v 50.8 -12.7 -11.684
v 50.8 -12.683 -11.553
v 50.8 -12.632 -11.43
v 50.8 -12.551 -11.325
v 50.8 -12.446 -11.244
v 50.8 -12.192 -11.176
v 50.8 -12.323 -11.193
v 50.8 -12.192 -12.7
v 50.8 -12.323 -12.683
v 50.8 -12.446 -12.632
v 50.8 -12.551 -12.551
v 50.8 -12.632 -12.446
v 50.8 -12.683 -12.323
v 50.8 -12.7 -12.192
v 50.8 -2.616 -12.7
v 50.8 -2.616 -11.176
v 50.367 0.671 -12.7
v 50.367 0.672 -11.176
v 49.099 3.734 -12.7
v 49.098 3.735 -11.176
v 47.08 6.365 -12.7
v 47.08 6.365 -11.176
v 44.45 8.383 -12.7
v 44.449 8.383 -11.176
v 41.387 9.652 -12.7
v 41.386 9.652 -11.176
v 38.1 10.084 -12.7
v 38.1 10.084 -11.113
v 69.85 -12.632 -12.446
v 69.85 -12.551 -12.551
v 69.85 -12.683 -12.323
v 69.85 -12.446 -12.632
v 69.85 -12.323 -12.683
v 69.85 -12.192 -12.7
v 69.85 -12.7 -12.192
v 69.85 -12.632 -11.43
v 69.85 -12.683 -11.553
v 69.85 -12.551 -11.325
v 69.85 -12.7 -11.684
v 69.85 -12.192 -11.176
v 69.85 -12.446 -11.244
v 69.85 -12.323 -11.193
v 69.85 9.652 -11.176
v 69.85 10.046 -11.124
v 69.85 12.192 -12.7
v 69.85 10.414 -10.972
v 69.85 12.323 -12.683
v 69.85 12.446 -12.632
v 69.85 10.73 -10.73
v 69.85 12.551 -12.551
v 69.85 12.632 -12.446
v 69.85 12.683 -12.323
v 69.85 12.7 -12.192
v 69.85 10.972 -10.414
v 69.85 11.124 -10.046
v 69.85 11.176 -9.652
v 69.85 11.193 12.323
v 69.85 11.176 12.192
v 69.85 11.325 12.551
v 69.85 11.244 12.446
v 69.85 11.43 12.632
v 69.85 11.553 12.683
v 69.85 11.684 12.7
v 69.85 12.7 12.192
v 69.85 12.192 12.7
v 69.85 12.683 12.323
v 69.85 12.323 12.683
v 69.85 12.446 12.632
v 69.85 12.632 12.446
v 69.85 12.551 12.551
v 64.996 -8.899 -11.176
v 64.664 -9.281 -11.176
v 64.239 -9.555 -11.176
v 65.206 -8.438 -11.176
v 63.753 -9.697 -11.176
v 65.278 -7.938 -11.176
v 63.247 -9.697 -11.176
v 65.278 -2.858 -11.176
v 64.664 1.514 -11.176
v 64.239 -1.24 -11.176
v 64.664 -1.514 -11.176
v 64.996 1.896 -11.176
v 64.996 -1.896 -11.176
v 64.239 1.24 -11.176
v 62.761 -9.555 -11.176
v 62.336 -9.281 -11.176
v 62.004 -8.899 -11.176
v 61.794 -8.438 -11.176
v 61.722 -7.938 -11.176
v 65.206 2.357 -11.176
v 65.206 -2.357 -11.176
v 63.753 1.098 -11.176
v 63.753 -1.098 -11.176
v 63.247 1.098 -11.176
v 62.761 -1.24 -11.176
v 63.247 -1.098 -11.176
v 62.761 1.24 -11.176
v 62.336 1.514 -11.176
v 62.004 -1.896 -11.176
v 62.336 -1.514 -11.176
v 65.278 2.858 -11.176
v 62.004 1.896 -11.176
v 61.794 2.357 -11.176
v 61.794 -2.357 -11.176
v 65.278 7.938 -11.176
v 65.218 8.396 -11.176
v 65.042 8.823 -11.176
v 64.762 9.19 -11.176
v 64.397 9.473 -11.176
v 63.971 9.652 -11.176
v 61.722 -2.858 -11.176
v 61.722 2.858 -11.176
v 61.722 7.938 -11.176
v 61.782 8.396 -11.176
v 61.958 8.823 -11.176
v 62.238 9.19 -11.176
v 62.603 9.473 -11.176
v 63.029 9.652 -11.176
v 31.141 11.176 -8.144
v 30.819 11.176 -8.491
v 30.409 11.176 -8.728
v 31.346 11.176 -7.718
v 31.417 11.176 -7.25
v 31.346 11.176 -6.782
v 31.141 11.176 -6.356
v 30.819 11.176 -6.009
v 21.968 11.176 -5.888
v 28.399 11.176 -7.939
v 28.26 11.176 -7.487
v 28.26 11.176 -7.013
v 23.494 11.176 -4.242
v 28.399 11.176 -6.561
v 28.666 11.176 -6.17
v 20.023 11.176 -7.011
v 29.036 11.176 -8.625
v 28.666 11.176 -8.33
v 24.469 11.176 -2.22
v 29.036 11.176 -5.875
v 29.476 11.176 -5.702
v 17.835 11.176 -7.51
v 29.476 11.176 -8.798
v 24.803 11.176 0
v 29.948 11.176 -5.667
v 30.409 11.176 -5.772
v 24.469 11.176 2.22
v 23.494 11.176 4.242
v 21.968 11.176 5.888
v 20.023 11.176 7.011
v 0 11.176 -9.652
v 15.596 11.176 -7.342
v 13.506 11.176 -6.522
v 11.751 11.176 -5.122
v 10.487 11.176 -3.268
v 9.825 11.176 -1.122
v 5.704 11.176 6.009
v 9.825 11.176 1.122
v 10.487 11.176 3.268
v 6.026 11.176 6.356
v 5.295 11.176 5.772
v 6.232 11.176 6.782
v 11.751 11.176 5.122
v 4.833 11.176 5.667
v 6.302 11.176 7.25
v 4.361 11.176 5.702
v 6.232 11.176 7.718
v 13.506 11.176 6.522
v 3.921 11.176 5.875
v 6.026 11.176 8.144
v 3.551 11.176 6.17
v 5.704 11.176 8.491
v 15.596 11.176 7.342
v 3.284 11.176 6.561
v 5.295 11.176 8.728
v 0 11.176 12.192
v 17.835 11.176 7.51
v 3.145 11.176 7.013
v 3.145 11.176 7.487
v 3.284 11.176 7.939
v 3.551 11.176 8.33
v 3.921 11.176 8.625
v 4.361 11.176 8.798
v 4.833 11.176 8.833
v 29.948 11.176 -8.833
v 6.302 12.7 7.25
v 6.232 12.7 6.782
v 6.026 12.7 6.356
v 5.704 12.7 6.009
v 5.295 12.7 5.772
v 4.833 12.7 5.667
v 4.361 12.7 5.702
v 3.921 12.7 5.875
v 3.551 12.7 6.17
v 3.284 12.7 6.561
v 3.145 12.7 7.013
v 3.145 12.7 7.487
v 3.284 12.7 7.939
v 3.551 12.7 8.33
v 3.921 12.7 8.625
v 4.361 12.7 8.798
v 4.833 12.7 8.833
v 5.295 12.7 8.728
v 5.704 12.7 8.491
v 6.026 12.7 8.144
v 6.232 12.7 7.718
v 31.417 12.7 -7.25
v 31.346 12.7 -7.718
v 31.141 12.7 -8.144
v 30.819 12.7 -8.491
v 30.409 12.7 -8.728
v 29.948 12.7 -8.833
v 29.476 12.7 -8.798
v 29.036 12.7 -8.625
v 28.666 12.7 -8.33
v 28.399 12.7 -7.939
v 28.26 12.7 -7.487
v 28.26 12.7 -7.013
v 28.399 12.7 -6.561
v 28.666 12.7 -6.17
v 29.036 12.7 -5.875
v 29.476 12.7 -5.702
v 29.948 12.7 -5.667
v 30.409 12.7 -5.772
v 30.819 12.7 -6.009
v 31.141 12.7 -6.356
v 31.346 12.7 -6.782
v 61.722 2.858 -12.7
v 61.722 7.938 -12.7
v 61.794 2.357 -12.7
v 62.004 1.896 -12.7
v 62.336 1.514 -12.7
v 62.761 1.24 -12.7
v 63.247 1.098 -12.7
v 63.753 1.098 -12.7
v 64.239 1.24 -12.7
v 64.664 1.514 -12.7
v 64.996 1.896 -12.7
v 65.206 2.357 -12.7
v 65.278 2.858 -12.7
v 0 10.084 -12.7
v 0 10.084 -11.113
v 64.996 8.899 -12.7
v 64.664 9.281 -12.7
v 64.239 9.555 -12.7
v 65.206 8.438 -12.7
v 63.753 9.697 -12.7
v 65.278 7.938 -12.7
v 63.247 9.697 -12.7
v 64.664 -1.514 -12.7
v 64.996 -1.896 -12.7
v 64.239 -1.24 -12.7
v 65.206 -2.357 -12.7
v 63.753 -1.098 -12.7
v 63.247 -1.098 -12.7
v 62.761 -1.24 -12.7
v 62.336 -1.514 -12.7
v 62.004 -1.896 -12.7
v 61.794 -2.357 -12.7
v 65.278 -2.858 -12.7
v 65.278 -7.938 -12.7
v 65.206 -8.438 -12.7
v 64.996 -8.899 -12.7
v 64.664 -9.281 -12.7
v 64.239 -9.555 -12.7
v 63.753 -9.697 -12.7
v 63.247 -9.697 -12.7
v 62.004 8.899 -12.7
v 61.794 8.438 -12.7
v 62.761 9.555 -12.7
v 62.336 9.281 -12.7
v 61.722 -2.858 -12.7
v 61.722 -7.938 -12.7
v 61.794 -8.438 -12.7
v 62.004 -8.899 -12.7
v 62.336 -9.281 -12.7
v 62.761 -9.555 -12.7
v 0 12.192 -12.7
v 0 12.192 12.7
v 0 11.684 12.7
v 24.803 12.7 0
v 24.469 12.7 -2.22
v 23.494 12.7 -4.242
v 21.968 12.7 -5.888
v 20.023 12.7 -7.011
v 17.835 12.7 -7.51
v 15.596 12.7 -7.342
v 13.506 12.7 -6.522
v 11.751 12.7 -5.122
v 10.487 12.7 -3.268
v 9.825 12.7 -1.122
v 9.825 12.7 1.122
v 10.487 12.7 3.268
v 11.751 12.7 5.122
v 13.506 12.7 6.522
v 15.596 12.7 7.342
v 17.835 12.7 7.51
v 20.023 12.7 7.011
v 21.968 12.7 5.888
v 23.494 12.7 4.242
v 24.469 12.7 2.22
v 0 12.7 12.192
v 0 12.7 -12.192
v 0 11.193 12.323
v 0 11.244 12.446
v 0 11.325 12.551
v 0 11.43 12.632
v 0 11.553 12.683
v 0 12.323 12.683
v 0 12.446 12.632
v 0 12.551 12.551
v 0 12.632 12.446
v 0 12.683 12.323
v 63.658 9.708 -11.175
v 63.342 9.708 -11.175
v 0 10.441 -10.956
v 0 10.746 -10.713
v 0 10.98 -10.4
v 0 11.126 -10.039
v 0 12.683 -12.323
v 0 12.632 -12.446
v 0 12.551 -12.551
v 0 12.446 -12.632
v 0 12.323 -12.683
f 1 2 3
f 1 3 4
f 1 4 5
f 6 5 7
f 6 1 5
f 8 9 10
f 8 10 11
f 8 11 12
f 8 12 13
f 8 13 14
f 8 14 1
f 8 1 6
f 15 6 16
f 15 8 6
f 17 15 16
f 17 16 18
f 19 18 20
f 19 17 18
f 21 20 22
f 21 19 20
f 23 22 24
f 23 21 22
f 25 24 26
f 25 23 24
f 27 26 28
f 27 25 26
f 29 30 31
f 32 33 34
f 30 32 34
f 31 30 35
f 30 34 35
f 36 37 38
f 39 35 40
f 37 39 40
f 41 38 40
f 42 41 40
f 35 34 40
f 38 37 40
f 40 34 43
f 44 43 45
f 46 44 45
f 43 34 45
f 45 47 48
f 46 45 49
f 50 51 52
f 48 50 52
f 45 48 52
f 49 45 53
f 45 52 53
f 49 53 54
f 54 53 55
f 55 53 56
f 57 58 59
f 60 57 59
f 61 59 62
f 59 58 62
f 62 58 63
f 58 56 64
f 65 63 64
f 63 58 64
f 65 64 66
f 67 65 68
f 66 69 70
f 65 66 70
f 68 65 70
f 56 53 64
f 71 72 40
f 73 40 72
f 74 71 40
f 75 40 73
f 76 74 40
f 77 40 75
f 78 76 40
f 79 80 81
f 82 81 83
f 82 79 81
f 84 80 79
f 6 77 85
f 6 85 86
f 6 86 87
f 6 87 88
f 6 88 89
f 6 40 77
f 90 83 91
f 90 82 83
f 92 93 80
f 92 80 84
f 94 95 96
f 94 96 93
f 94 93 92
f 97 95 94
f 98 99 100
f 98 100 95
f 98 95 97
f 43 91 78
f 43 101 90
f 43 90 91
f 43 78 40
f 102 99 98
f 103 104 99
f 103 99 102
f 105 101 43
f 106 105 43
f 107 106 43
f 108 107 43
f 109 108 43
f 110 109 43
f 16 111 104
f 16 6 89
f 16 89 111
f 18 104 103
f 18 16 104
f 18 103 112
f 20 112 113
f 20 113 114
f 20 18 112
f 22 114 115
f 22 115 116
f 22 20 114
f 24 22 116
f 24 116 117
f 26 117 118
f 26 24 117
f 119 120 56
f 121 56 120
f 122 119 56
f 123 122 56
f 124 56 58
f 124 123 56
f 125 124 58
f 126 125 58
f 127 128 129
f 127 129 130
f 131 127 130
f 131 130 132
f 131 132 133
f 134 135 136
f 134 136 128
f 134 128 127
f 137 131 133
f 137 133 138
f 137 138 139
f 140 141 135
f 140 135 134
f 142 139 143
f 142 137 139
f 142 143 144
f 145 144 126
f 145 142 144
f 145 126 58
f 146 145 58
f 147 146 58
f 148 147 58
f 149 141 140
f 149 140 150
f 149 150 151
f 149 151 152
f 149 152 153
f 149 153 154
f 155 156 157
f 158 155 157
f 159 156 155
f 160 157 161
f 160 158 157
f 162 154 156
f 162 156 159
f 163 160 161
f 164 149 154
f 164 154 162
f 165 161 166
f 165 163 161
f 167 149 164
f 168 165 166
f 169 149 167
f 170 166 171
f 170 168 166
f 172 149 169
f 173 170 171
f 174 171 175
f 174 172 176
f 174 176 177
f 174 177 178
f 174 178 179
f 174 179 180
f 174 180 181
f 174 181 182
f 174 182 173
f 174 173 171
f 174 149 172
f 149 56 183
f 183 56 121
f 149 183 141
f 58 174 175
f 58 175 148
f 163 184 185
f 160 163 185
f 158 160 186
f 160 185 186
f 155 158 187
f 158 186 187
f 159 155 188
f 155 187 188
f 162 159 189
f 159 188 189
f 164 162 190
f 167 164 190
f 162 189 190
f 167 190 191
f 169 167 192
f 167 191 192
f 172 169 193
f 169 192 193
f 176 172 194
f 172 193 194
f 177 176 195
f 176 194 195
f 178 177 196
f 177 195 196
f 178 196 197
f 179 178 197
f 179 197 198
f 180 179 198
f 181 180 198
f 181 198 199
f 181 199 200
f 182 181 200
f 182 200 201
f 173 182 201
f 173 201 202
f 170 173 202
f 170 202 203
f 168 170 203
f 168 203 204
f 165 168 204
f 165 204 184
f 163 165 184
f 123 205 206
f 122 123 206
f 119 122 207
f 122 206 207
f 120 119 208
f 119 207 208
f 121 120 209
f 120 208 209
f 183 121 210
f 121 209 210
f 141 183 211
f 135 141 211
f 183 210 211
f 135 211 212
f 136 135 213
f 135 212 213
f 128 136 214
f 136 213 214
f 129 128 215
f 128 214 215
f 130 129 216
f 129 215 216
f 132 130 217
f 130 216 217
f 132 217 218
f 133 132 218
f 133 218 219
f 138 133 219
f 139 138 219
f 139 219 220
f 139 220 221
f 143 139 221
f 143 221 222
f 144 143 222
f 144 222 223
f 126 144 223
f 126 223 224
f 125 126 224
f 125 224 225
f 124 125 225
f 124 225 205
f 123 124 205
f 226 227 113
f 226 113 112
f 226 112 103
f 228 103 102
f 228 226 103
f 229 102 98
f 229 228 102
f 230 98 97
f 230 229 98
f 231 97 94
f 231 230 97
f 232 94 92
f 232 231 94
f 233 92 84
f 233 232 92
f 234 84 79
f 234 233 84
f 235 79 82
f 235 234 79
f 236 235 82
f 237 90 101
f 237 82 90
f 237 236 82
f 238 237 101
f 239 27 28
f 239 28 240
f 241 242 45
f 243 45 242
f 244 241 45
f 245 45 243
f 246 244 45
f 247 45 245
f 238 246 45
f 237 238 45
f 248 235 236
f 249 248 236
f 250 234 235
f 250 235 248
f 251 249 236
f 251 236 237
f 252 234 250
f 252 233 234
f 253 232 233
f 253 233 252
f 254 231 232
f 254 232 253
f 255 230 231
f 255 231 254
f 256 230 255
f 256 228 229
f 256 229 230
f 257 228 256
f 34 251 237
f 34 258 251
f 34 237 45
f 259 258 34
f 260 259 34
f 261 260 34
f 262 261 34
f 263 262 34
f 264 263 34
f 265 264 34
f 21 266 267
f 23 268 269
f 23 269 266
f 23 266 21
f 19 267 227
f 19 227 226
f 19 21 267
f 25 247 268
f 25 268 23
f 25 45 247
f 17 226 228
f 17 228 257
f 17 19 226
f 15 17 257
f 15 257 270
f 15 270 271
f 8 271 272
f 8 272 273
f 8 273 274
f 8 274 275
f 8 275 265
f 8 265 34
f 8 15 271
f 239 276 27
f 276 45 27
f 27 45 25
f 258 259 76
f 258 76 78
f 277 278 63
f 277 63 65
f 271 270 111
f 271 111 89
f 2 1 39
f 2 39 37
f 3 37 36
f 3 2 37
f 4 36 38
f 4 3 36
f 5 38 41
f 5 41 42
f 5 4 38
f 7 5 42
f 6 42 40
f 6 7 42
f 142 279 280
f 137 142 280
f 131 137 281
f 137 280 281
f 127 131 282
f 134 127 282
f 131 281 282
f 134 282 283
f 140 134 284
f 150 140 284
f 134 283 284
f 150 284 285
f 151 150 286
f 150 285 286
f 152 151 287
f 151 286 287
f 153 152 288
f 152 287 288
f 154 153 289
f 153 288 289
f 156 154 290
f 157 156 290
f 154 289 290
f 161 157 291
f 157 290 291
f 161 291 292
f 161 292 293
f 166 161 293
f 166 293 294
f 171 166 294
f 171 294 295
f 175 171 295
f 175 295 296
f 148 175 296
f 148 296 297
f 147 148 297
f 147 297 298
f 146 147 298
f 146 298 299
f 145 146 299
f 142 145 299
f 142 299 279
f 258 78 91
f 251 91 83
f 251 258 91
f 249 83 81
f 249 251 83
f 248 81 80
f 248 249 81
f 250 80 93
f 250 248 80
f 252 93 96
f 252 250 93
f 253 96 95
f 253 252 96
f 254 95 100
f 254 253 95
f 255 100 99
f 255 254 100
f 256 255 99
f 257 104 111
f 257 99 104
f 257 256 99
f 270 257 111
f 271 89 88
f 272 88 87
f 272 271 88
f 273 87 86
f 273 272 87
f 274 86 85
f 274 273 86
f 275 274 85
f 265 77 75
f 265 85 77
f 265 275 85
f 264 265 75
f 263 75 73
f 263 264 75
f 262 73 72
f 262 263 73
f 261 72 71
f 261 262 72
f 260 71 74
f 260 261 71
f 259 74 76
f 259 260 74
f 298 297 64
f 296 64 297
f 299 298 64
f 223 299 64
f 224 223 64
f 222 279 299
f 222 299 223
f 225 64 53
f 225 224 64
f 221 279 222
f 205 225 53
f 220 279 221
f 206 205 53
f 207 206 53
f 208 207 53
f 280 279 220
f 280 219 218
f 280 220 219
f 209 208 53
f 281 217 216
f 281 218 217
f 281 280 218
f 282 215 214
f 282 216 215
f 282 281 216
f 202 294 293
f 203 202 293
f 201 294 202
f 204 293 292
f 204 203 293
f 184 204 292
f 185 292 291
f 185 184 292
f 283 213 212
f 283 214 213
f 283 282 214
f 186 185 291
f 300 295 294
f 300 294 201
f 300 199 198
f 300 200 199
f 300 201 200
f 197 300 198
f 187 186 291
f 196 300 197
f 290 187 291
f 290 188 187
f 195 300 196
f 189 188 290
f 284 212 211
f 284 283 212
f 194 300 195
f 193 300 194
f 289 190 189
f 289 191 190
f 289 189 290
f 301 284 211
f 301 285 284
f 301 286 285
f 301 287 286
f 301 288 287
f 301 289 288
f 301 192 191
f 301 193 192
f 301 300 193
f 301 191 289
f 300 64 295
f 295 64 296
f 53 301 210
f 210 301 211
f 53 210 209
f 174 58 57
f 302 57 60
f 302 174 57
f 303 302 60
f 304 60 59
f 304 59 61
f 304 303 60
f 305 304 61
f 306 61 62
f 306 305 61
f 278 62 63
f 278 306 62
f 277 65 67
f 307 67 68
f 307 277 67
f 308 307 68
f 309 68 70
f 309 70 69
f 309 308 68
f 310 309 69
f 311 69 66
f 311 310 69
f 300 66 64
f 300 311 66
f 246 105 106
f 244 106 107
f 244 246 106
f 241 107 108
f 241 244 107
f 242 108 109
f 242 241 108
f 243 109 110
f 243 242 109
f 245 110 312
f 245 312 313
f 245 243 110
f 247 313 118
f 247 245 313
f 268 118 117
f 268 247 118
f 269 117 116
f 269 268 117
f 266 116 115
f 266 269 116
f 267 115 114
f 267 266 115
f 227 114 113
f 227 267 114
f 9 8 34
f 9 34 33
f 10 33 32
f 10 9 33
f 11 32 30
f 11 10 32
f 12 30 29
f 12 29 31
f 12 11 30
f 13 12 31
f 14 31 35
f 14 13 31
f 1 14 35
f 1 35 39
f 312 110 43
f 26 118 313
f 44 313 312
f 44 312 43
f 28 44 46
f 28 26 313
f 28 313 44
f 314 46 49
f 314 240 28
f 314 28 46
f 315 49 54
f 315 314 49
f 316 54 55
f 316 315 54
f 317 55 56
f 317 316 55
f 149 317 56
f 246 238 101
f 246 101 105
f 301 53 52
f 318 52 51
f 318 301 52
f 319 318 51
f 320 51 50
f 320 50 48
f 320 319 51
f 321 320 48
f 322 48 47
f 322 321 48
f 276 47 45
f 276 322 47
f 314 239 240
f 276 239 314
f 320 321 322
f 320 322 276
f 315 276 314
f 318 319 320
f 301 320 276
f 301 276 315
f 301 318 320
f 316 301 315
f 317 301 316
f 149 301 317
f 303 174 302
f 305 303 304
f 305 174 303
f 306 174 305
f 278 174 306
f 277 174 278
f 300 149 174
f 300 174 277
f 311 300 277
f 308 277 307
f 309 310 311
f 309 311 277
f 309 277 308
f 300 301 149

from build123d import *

# Parameters (mm, degrees)
BOSS_EXTRUDE1_DEPTH = 69.85
SKETCH2_R           = 7.5311
SKETCH2_R_2         = 1.5875
CUT_EXTRUDE1_DEPTH  = 26.4
CUT_EXTRUDE2_DEPTH  = 26.4
CUT_EXTRUDE3_DEPTH  = 26.4


with BuildPart() as part:
    # Sketch1 → Boss-Extrude1 (new body)
    with BuildSketch(Plane(origin=(0, 0, 0), x_dir=(0, 0, -1), z_dir=(1, 0, 0))):
        with BuildLine():
            Line((9.652, 11.176), (-11.176, 11.176))
            Line((-11.176, 11.176), (-12.192, 11.176))
            ThreePointArc((-12.192, 11.176), (-12.551210245, 11.324789755), (-12.7, 11.684))
            Line((-12.7, 11.684), (-12.7, 12.192))
            ThreePointArc((-12.7, 12.192), (-12.551210245, 12.551210245), (-12.192, 12.7))
            Line((-12.192, 12.7), (12.192, 12.7))
            ThreePointArc((12.192, 12.7), (12.551210245, 12.551210245), (12.7, 12.192))
            Line((12.7, 12.192), (12.7, -12.192))
            ThreePointArc((12.7, -12.192), (12.551210245, -12.551210245), (12.192, -12.7))
            Line((12.192, -12.7), (11.684, -12.7))
            ThreePointArc((11.684, -12.7), (11.324789755, -12.551210245), (11.176, -12.192))
            Line((11.176, -12.192), (11.176, -11.176))
            Line((11.176, -11.176), (11.176, 9.652))
            ThreePointArc((11.176, 9.652), (10.729630735, 10.729630735), (9.652, 11.176))
        make_face()
    extrude(amount=BOSS_EXTRUDE1_DEPTH)

    # Sketch2 → Cut-Extrude1 (cut, through all)
    with BuildSketch(Plane(origin=(0, 12.7, 0), x_dir=(1, 0, 0), z_dir=(0, 1, 0))):
        with Locations((17.272, 0)):
            Circle(SKETCH2_R)
        with Locations((29.829368355, 7.25)):
            Circle(SKETCH2_R_2)
        with Locations((4.714631645, -7.25)):
            Circle(SKETCH2_R_2)
    extrude(amount=-CUT_EXTRUDE1_DEPTH, mode=Mode.SUBTRACT)

    # Sketch3 → Cut-Extrude2 (cut, through all)
    with BuildSketch(Plane(origin=(0, 0, -12.7), x_dir=(-1, 0, 0), z_dir=(0, 0, -1))):
        with BuildLine():
            Line((-38.1, 10.084370729), (0, 10.084370729))
            ThreePointArc((0, 10.084370729), (12.7, -2.615629271), (0, -15.315629271))
            Line((0, -15.315629271), (-38.1, -15.315629271))
            Line((-38.1, -15.315629271), (-50.8, -15.315629271))
            Line((-50.8, -15.315629271), (-50.8, -2.615629271))
            ThreePointArc((-50.8, -2.615629271), (-47.080256121, 6.36462685), (-38.1, 10.084370729))
        make_face()
    extrude(amount=-CUT_EXTRUDE2_DEPTH, mode=Mode.SUBTRACT)

    # Sketch4 → Cut-Extrude3 (cut, through all)
    with BuildSketch(Plane(origin=(0, 0, -12.7), x_dir=(-1, 0, 0), z_dir=(0, 0, -1))):
        with BuildLine():
            Line((-65.278, -7.9375), (-65.278, -2.8575))
            ThreePointArc((-65.278, -2.8575), (-63.5, -1.0795), (-61.722, -2.8575))
            Line((-61.722, -2.8575), (-61.722, -7.9375))
            ThreePointArc((-61.722, -7.9375), (-63.5, -9.7155), (-65.278, -7.9375))
        make_face()
        with BuildLine():
            Line((-65.278, 2.8575), (-65.278, 7.9375))
            ThreePointArc((-65.278, 7.9375), (-63.5, 9.7155), (-61.722, 7.9375))
            Line((-61.722, 7.9375), (-61.722, 2.8575))
            ThreePointArc((-61.722, 2.8575), (-63.5, 1.0795), (-65.278, 2.8575))
        make_face()
    extrude(amount=-CUT_EXTRUDE3_DEPTH, mode=Mode.SUBTRACT)


solid = part.part
